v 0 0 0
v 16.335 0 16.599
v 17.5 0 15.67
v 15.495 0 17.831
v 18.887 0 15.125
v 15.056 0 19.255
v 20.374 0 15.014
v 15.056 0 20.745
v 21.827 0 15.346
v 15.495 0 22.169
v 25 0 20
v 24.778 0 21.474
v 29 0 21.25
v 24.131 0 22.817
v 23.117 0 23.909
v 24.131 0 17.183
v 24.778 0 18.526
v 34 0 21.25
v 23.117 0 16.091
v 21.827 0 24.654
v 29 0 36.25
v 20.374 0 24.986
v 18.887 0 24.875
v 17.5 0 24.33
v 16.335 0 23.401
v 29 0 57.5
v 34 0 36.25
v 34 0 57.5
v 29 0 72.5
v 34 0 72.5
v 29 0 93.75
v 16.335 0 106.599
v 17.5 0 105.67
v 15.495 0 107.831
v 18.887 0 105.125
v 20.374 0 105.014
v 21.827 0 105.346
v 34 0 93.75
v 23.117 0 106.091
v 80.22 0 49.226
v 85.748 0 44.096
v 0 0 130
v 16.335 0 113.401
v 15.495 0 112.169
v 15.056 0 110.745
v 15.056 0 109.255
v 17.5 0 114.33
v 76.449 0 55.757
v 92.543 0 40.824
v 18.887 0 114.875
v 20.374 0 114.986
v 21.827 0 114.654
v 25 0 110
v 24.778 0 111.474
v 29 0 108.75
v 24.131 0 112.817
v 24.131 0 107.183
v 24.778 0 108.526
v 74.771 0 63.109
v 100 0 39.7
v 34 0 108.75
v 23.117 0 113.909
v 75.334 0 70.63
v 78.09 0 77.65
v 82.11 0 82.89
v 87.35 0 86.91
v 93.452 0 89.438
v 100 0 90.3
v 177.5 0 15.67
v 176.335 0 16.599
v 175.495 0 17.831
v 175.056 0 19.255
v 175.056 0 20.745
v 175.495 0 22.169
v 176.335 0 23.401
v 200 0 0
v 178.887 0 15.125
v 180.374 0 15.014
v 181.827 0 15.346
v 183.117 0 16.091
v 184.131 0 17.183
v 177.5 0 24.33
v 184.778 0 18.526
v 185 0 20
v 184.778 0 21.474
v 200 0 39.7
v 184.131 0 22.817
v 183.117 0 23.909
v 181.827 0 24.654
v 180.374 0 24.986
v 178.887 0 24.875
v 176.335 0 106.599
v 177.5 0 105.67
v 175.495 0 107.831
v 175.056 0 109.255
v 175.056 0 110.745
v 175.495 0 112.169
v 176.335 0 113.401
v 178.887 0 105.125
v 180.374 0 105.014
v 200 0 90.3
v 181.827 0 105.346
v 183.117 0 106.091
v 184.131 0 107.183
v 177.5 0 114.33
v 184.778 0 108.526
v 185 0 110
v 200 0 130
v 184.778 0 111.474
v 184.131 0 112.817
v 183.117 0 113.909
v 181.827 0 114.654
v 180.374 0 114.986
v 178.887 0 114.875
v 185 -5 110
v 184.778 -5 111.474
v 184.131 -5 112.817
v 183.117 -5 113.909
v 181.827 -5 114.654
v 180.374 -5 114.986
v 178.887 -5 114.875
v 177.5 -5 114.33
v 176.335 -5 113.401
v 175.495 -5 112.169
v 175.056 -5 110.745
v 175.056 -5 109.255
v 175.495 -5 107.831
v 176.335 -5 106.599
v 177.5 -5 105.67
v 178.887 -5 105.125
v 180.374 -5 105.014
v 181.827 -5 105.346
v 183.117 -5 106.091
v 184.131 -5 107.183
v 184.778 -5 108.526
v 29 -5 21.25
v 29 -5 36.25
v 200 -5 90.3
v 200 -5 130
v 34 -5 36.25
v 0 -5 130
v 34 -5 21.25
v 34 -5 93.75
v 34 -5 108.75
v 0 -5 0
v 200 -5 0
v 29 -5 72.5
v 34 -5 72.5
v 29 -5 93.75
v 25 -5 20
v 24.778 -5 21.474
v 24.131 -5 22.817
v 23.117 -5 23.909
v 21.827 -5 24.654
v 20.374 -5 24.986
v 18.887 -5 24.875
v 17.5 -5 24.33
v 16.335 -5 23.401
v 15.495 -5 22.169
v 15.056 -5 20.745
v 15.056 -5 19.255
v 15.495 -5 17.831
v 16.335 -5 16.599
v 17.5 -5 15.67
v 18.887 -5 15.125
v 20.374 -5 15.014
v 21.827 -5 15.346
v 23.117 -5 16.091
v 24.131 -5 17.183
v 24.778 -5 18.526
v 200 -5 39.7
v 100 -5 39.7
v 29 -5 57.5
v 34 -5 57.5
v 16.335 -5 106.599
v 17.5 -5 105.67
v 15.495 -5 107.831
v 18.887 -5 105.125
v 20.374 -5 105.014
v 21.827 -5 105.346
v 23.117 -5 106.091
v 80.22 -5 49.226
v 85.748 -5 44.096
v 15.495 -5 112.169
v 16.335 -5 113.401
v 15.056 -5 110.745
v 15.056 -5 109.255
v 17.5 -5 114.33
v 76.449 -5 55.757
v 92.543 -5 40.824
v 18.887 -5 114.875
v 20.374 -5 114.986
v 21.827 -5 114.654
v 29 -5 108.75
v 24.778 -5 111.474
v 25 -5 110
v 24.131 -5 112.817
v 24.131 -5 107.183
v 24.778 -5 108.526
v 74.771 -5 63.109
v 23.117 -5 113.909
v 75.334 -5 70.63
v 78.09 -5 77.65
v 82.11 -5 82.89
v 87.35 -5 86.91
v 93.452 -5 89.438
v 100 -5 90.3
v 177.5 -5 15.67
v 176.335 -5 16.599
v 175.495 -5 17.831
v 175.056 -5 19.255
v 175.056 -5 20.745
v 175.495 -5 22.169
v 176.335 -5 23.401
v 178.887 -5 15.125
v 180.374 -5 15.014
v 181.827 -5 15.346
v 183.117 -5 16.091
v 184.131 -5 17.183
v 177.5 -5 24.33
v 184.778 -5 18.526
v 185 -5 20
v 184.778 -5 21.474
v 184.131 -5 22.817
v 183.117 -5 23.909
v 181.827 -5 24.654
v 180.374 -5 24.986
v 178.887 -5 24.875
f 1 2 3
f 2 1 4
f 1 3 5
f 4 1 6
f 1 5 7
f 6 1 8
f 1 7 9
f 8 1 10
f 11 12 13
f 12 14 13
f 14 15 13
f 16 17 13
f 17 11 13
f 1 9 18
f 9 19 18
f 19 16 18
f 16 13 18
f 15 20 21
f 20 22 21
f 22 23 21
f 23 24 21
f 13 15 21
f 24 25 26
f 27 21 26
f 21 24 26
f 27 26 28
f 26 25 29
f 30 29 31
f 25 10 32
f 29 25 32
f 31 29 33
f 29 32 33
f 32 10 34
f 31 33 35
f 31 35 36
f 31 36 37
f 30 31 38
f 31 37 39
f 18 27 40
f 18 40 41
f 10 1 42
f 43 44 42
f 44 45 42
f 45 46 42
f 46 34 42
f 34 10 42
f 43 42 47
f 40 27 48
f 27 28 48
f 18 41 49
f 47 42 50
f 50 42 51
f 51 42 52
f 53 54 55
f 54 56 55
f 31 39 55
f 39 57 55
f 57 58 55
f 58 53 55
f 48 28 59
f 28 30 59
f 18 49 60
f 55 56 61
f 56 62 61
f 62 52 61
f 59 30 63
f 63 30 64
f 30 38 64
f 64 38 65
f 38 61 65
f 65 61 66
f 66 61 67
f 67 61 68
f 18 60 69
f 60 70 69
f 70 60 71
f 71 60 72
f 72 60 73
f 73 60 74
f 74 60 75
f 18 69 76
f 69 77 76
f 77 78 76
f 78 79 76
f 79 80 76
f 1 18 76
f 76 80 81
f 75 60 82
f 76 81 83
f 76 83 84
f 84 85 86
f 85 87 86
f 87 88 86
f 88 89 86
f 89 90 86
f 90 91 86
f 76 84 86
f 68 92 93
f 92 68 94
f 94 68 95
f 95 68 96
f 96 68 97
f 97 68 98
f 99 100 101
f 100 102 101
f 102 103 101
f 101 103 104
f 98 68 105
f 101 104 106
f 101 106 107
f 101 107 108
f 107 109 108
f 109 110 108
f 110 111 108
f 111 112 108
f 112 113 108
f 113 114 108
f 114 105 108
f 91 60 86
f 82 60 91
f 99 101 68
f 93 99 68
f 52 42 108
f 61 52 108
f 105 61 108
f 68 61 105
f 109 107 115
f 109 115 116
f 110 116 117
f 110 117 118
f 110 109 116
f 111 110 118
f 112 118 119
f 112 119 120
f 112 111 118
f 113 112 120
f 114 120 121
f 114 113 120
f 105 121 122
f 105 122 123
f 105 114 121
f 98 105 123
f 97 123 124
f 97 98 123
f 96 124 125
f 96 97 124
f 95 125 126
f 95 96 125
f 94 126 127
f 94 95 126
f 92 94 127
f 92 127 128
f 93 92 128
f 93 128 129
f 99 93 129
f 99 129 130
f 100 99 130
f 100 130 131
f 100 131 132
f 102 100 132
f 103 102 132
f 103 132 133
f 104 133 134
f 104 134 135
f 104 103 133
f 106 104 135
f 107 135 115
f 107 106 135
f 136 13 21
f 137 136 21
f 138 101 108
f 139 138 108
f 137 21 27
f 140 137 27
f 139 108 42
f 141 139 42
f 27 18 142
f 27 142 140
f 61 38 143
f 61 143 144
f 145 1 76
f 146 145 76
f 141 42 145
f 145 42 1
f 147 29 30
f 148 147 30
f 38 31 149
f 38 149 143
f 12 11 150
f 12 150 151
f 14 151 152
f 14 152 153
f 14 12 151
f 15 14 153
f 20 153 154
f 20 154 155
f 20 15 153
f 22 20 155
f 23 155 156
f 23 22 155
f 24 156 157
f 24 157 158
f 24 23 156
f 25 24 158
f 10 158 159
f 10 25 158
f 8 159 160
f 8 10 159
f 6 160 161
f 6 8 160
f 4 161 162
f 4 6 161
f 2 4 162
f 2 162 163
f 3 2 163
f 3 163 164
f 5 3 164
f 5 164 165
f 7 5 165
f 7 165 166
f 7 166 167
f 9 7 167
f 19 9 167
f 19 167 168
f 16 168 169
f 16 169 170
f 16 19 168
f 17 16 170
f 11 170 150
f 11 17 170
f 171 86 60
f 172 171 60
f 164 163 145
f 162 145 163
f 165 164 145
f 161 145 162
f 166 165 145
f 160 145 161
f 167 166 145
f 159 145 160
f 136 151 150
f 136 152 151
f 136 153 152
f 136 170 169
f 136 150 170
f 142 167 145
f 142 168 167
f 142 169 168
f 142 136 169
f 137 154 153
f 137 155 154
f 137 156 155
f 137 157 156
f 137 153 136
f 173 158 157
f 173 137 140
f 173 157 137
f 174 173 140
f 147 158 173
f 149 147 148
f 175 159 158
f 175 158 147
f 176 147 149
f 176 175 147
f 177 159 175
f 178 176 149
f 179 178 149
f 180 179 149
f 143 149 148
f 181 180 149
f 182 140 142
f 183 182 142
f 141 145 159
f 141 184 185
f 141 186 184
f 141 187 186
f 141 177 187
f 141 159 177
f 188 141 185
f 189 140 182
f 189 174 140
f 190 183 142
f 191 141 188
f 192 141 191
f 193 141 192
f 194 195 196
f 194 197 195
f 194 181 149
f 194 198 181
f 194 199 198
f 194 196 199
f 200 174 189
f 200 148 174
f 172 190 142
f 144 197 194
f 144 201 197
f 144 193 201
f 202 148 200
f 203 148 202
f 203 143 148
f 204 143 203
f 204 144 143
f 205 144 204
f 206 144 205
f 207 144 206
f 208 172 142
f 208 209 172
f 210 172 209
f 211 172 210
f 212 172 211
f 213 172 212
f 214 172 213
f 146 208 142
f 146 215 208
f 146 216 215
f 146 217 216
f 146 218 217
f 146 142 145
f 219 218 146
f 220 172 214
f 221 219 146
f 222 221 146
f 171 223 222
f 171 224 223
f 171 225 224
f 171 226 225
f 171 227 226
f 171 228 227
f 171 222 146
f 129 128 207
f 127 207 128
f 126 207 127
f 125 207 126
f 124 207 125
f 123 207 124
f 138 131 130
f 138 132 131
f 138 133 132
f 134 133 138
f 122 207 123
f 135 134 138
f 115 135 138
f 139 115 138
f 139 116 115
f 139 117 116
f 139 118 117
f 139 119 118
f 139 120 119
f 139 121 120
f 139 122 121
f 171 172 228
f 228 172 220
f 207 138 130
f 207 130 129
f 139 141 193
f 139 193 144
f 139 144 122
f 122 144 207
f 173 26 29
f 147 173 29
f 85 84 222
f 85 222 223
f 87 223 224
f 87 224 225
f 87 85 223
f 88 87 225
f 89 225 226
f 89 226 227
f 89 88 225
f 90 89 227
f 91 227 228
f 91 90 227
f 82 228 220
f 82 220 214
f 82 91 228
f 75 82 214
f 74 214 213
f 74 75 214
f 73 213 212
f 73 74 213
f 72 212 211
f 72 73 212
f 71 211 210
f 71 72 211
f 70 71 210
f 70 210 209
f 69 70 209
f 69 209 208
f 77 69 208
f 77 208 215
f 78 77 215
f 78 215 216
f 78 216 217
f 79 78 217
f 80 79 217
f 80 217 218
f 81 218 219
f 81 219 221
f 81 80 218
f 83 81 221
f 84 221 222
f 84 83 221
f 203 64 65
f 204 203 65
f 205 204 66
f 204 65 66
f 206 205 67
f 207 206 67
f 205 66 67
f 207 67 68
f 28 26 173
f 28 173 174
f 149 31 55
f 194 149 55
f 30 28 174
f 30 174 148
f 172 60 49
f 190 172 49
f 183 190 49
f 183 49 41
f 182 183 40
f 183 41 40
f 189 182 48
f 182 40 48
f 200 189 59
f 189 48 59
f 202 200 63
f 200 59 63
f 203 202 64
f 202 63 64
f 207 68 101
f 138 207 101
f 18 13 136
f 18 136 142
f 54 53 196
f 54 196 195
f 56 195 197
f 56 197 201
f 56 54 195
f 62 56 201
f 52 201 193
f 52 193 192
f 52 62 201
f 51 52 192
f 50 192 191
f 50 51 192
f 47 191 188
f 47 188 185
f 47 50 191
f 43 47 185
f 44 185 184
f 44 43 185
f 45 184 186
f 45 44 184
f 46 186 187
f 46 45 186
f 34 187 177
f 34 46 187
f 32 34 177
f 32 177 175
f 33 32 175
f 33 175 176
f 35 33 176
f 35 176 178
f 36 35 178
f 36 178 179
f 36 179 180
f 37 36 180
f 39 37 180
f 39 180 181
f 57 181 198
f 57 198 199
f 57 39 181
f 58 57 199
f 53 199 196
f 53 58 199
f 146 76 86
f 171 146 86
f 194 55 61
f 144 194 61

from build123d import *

# Parameters (mm, degrees)
F0_R     = 5
F0_W     = 5
F0_H     = 15
F0_W_2   = 40
F0_H_2   = 8
F1_DEPTH = 5


# Not quite as in the source:
# - a feature names something its author has since deleted; it is built from what else it names


with BuildPart() as f1:
    # F0 (on Front) → F1 (new body)
    with BuildSketch(Plane.XZ):
        with BuildLine():
            Line((0, 122), (0, 0))
            Line((0, 0), (40, 0))
            Line((40, 0), (42, 0))
            Line((42, 0), (158, 0))
            Line((158, 0), (160, 0))
            Line((160, 0), (200, 0))
            Line((200, 0), (200, 39.7))
            Line((200, 39.7), (159.7, 39.7))
            Line((159.7, 39.7), (143.1136062057, 39.7))
            ThreePointArc((143.1136062057, 39.7), (138.9711431703, 37.5), (134.8286801349, 39.7))
            Line((134.8286801349, 39.7), (100, 39.7))
            ThreePointArc((100, 39.7), (78.0895572843, 52.35), (78.0895572843, 77.65))
            ThreePointArc((78.0895572843, 77.65), (87.35, 86.9104427157), (100, 90.3))
            Line((100, 90.3), (159.7, 90.3))
            Line((159.7, 90.3), (200, 90.3))
            Line((200, 90.3), (200, 122))
            Line((200, 122), (160, 122))
            Line((160, 122), (158, 130))
            Line((158, 130), (42, 130))
            Line((42, 130), (40, 122))
            Line((40, 122), (0, 122))
        make_face()
        with Locations((20, 20)):
            Circle(F0_R, mode=Mode.SUBTRACT)
        with Locations((31.5, 28.75)):
            Rectangle(F0_W, F0_H, mode=Mode.SUBTRACT)
        with Locations((180, 20)):
            Circle(F0_R, mode=Mode.SUBTRACT)
        with Locations((31.5, 65)):
            Rectangle(F0_W, F0_H, mode=Mode.SUBTRACT)
        with BuildLine():
            ThreePointArc((66.0288568297, 87.5), (65.8584859611, 86.2059047745), (65.3589838486, 85))
            ThreePointArc((65.3589838486, 85), (56.1992276983, 88.7940952255), (66.0288568297, 87.5))
        make_face(mode=Mode.SUBTRACT)
        with Locations((20, 110)):
            Circle(F0_R, mode=Mode.SUBTRACT)
        with Locations((31.5, 101.25)):
            Rectangle(F0_W, F0_H, mode=Mode.SUBTRACT)
        with Locations((180, 110)):
            Circle(F0_R, mode=Mode.SUBTRACT)
        with BuildLine():
            ThreePointArc((66.0288568297, 87.5), (56.1992276983, 88.7940952255), (65.3589838486, 85))
            ThreePointArc((65.3589838486, 85), (65.8584859611, 86.2059047745), (66.0288568297, 87.5))
        make_face()
        with Locations((20, 126)):
            Rectangle(F0_W_2, F0_H_2)
        with Locations((180, 126)):
            Rectangle(F0_W_2, F0_H_2)
        Polygon((160, 130), (158, 130), (160, 122), align=None)
        Polygon((40, 130), (40, 122), (42, 130), align=None)
        with BuildLine():
            ThreePointArc((134.8286801349, 39.7), (138.9711431703, 37.5), (143.1136062057, 39.7))
            Line((143.1136062057, 39.7), (134.8286801349, 39.7))
        make_face()
    extrude(amount=F1_DEPTH)


solid = f1.part
